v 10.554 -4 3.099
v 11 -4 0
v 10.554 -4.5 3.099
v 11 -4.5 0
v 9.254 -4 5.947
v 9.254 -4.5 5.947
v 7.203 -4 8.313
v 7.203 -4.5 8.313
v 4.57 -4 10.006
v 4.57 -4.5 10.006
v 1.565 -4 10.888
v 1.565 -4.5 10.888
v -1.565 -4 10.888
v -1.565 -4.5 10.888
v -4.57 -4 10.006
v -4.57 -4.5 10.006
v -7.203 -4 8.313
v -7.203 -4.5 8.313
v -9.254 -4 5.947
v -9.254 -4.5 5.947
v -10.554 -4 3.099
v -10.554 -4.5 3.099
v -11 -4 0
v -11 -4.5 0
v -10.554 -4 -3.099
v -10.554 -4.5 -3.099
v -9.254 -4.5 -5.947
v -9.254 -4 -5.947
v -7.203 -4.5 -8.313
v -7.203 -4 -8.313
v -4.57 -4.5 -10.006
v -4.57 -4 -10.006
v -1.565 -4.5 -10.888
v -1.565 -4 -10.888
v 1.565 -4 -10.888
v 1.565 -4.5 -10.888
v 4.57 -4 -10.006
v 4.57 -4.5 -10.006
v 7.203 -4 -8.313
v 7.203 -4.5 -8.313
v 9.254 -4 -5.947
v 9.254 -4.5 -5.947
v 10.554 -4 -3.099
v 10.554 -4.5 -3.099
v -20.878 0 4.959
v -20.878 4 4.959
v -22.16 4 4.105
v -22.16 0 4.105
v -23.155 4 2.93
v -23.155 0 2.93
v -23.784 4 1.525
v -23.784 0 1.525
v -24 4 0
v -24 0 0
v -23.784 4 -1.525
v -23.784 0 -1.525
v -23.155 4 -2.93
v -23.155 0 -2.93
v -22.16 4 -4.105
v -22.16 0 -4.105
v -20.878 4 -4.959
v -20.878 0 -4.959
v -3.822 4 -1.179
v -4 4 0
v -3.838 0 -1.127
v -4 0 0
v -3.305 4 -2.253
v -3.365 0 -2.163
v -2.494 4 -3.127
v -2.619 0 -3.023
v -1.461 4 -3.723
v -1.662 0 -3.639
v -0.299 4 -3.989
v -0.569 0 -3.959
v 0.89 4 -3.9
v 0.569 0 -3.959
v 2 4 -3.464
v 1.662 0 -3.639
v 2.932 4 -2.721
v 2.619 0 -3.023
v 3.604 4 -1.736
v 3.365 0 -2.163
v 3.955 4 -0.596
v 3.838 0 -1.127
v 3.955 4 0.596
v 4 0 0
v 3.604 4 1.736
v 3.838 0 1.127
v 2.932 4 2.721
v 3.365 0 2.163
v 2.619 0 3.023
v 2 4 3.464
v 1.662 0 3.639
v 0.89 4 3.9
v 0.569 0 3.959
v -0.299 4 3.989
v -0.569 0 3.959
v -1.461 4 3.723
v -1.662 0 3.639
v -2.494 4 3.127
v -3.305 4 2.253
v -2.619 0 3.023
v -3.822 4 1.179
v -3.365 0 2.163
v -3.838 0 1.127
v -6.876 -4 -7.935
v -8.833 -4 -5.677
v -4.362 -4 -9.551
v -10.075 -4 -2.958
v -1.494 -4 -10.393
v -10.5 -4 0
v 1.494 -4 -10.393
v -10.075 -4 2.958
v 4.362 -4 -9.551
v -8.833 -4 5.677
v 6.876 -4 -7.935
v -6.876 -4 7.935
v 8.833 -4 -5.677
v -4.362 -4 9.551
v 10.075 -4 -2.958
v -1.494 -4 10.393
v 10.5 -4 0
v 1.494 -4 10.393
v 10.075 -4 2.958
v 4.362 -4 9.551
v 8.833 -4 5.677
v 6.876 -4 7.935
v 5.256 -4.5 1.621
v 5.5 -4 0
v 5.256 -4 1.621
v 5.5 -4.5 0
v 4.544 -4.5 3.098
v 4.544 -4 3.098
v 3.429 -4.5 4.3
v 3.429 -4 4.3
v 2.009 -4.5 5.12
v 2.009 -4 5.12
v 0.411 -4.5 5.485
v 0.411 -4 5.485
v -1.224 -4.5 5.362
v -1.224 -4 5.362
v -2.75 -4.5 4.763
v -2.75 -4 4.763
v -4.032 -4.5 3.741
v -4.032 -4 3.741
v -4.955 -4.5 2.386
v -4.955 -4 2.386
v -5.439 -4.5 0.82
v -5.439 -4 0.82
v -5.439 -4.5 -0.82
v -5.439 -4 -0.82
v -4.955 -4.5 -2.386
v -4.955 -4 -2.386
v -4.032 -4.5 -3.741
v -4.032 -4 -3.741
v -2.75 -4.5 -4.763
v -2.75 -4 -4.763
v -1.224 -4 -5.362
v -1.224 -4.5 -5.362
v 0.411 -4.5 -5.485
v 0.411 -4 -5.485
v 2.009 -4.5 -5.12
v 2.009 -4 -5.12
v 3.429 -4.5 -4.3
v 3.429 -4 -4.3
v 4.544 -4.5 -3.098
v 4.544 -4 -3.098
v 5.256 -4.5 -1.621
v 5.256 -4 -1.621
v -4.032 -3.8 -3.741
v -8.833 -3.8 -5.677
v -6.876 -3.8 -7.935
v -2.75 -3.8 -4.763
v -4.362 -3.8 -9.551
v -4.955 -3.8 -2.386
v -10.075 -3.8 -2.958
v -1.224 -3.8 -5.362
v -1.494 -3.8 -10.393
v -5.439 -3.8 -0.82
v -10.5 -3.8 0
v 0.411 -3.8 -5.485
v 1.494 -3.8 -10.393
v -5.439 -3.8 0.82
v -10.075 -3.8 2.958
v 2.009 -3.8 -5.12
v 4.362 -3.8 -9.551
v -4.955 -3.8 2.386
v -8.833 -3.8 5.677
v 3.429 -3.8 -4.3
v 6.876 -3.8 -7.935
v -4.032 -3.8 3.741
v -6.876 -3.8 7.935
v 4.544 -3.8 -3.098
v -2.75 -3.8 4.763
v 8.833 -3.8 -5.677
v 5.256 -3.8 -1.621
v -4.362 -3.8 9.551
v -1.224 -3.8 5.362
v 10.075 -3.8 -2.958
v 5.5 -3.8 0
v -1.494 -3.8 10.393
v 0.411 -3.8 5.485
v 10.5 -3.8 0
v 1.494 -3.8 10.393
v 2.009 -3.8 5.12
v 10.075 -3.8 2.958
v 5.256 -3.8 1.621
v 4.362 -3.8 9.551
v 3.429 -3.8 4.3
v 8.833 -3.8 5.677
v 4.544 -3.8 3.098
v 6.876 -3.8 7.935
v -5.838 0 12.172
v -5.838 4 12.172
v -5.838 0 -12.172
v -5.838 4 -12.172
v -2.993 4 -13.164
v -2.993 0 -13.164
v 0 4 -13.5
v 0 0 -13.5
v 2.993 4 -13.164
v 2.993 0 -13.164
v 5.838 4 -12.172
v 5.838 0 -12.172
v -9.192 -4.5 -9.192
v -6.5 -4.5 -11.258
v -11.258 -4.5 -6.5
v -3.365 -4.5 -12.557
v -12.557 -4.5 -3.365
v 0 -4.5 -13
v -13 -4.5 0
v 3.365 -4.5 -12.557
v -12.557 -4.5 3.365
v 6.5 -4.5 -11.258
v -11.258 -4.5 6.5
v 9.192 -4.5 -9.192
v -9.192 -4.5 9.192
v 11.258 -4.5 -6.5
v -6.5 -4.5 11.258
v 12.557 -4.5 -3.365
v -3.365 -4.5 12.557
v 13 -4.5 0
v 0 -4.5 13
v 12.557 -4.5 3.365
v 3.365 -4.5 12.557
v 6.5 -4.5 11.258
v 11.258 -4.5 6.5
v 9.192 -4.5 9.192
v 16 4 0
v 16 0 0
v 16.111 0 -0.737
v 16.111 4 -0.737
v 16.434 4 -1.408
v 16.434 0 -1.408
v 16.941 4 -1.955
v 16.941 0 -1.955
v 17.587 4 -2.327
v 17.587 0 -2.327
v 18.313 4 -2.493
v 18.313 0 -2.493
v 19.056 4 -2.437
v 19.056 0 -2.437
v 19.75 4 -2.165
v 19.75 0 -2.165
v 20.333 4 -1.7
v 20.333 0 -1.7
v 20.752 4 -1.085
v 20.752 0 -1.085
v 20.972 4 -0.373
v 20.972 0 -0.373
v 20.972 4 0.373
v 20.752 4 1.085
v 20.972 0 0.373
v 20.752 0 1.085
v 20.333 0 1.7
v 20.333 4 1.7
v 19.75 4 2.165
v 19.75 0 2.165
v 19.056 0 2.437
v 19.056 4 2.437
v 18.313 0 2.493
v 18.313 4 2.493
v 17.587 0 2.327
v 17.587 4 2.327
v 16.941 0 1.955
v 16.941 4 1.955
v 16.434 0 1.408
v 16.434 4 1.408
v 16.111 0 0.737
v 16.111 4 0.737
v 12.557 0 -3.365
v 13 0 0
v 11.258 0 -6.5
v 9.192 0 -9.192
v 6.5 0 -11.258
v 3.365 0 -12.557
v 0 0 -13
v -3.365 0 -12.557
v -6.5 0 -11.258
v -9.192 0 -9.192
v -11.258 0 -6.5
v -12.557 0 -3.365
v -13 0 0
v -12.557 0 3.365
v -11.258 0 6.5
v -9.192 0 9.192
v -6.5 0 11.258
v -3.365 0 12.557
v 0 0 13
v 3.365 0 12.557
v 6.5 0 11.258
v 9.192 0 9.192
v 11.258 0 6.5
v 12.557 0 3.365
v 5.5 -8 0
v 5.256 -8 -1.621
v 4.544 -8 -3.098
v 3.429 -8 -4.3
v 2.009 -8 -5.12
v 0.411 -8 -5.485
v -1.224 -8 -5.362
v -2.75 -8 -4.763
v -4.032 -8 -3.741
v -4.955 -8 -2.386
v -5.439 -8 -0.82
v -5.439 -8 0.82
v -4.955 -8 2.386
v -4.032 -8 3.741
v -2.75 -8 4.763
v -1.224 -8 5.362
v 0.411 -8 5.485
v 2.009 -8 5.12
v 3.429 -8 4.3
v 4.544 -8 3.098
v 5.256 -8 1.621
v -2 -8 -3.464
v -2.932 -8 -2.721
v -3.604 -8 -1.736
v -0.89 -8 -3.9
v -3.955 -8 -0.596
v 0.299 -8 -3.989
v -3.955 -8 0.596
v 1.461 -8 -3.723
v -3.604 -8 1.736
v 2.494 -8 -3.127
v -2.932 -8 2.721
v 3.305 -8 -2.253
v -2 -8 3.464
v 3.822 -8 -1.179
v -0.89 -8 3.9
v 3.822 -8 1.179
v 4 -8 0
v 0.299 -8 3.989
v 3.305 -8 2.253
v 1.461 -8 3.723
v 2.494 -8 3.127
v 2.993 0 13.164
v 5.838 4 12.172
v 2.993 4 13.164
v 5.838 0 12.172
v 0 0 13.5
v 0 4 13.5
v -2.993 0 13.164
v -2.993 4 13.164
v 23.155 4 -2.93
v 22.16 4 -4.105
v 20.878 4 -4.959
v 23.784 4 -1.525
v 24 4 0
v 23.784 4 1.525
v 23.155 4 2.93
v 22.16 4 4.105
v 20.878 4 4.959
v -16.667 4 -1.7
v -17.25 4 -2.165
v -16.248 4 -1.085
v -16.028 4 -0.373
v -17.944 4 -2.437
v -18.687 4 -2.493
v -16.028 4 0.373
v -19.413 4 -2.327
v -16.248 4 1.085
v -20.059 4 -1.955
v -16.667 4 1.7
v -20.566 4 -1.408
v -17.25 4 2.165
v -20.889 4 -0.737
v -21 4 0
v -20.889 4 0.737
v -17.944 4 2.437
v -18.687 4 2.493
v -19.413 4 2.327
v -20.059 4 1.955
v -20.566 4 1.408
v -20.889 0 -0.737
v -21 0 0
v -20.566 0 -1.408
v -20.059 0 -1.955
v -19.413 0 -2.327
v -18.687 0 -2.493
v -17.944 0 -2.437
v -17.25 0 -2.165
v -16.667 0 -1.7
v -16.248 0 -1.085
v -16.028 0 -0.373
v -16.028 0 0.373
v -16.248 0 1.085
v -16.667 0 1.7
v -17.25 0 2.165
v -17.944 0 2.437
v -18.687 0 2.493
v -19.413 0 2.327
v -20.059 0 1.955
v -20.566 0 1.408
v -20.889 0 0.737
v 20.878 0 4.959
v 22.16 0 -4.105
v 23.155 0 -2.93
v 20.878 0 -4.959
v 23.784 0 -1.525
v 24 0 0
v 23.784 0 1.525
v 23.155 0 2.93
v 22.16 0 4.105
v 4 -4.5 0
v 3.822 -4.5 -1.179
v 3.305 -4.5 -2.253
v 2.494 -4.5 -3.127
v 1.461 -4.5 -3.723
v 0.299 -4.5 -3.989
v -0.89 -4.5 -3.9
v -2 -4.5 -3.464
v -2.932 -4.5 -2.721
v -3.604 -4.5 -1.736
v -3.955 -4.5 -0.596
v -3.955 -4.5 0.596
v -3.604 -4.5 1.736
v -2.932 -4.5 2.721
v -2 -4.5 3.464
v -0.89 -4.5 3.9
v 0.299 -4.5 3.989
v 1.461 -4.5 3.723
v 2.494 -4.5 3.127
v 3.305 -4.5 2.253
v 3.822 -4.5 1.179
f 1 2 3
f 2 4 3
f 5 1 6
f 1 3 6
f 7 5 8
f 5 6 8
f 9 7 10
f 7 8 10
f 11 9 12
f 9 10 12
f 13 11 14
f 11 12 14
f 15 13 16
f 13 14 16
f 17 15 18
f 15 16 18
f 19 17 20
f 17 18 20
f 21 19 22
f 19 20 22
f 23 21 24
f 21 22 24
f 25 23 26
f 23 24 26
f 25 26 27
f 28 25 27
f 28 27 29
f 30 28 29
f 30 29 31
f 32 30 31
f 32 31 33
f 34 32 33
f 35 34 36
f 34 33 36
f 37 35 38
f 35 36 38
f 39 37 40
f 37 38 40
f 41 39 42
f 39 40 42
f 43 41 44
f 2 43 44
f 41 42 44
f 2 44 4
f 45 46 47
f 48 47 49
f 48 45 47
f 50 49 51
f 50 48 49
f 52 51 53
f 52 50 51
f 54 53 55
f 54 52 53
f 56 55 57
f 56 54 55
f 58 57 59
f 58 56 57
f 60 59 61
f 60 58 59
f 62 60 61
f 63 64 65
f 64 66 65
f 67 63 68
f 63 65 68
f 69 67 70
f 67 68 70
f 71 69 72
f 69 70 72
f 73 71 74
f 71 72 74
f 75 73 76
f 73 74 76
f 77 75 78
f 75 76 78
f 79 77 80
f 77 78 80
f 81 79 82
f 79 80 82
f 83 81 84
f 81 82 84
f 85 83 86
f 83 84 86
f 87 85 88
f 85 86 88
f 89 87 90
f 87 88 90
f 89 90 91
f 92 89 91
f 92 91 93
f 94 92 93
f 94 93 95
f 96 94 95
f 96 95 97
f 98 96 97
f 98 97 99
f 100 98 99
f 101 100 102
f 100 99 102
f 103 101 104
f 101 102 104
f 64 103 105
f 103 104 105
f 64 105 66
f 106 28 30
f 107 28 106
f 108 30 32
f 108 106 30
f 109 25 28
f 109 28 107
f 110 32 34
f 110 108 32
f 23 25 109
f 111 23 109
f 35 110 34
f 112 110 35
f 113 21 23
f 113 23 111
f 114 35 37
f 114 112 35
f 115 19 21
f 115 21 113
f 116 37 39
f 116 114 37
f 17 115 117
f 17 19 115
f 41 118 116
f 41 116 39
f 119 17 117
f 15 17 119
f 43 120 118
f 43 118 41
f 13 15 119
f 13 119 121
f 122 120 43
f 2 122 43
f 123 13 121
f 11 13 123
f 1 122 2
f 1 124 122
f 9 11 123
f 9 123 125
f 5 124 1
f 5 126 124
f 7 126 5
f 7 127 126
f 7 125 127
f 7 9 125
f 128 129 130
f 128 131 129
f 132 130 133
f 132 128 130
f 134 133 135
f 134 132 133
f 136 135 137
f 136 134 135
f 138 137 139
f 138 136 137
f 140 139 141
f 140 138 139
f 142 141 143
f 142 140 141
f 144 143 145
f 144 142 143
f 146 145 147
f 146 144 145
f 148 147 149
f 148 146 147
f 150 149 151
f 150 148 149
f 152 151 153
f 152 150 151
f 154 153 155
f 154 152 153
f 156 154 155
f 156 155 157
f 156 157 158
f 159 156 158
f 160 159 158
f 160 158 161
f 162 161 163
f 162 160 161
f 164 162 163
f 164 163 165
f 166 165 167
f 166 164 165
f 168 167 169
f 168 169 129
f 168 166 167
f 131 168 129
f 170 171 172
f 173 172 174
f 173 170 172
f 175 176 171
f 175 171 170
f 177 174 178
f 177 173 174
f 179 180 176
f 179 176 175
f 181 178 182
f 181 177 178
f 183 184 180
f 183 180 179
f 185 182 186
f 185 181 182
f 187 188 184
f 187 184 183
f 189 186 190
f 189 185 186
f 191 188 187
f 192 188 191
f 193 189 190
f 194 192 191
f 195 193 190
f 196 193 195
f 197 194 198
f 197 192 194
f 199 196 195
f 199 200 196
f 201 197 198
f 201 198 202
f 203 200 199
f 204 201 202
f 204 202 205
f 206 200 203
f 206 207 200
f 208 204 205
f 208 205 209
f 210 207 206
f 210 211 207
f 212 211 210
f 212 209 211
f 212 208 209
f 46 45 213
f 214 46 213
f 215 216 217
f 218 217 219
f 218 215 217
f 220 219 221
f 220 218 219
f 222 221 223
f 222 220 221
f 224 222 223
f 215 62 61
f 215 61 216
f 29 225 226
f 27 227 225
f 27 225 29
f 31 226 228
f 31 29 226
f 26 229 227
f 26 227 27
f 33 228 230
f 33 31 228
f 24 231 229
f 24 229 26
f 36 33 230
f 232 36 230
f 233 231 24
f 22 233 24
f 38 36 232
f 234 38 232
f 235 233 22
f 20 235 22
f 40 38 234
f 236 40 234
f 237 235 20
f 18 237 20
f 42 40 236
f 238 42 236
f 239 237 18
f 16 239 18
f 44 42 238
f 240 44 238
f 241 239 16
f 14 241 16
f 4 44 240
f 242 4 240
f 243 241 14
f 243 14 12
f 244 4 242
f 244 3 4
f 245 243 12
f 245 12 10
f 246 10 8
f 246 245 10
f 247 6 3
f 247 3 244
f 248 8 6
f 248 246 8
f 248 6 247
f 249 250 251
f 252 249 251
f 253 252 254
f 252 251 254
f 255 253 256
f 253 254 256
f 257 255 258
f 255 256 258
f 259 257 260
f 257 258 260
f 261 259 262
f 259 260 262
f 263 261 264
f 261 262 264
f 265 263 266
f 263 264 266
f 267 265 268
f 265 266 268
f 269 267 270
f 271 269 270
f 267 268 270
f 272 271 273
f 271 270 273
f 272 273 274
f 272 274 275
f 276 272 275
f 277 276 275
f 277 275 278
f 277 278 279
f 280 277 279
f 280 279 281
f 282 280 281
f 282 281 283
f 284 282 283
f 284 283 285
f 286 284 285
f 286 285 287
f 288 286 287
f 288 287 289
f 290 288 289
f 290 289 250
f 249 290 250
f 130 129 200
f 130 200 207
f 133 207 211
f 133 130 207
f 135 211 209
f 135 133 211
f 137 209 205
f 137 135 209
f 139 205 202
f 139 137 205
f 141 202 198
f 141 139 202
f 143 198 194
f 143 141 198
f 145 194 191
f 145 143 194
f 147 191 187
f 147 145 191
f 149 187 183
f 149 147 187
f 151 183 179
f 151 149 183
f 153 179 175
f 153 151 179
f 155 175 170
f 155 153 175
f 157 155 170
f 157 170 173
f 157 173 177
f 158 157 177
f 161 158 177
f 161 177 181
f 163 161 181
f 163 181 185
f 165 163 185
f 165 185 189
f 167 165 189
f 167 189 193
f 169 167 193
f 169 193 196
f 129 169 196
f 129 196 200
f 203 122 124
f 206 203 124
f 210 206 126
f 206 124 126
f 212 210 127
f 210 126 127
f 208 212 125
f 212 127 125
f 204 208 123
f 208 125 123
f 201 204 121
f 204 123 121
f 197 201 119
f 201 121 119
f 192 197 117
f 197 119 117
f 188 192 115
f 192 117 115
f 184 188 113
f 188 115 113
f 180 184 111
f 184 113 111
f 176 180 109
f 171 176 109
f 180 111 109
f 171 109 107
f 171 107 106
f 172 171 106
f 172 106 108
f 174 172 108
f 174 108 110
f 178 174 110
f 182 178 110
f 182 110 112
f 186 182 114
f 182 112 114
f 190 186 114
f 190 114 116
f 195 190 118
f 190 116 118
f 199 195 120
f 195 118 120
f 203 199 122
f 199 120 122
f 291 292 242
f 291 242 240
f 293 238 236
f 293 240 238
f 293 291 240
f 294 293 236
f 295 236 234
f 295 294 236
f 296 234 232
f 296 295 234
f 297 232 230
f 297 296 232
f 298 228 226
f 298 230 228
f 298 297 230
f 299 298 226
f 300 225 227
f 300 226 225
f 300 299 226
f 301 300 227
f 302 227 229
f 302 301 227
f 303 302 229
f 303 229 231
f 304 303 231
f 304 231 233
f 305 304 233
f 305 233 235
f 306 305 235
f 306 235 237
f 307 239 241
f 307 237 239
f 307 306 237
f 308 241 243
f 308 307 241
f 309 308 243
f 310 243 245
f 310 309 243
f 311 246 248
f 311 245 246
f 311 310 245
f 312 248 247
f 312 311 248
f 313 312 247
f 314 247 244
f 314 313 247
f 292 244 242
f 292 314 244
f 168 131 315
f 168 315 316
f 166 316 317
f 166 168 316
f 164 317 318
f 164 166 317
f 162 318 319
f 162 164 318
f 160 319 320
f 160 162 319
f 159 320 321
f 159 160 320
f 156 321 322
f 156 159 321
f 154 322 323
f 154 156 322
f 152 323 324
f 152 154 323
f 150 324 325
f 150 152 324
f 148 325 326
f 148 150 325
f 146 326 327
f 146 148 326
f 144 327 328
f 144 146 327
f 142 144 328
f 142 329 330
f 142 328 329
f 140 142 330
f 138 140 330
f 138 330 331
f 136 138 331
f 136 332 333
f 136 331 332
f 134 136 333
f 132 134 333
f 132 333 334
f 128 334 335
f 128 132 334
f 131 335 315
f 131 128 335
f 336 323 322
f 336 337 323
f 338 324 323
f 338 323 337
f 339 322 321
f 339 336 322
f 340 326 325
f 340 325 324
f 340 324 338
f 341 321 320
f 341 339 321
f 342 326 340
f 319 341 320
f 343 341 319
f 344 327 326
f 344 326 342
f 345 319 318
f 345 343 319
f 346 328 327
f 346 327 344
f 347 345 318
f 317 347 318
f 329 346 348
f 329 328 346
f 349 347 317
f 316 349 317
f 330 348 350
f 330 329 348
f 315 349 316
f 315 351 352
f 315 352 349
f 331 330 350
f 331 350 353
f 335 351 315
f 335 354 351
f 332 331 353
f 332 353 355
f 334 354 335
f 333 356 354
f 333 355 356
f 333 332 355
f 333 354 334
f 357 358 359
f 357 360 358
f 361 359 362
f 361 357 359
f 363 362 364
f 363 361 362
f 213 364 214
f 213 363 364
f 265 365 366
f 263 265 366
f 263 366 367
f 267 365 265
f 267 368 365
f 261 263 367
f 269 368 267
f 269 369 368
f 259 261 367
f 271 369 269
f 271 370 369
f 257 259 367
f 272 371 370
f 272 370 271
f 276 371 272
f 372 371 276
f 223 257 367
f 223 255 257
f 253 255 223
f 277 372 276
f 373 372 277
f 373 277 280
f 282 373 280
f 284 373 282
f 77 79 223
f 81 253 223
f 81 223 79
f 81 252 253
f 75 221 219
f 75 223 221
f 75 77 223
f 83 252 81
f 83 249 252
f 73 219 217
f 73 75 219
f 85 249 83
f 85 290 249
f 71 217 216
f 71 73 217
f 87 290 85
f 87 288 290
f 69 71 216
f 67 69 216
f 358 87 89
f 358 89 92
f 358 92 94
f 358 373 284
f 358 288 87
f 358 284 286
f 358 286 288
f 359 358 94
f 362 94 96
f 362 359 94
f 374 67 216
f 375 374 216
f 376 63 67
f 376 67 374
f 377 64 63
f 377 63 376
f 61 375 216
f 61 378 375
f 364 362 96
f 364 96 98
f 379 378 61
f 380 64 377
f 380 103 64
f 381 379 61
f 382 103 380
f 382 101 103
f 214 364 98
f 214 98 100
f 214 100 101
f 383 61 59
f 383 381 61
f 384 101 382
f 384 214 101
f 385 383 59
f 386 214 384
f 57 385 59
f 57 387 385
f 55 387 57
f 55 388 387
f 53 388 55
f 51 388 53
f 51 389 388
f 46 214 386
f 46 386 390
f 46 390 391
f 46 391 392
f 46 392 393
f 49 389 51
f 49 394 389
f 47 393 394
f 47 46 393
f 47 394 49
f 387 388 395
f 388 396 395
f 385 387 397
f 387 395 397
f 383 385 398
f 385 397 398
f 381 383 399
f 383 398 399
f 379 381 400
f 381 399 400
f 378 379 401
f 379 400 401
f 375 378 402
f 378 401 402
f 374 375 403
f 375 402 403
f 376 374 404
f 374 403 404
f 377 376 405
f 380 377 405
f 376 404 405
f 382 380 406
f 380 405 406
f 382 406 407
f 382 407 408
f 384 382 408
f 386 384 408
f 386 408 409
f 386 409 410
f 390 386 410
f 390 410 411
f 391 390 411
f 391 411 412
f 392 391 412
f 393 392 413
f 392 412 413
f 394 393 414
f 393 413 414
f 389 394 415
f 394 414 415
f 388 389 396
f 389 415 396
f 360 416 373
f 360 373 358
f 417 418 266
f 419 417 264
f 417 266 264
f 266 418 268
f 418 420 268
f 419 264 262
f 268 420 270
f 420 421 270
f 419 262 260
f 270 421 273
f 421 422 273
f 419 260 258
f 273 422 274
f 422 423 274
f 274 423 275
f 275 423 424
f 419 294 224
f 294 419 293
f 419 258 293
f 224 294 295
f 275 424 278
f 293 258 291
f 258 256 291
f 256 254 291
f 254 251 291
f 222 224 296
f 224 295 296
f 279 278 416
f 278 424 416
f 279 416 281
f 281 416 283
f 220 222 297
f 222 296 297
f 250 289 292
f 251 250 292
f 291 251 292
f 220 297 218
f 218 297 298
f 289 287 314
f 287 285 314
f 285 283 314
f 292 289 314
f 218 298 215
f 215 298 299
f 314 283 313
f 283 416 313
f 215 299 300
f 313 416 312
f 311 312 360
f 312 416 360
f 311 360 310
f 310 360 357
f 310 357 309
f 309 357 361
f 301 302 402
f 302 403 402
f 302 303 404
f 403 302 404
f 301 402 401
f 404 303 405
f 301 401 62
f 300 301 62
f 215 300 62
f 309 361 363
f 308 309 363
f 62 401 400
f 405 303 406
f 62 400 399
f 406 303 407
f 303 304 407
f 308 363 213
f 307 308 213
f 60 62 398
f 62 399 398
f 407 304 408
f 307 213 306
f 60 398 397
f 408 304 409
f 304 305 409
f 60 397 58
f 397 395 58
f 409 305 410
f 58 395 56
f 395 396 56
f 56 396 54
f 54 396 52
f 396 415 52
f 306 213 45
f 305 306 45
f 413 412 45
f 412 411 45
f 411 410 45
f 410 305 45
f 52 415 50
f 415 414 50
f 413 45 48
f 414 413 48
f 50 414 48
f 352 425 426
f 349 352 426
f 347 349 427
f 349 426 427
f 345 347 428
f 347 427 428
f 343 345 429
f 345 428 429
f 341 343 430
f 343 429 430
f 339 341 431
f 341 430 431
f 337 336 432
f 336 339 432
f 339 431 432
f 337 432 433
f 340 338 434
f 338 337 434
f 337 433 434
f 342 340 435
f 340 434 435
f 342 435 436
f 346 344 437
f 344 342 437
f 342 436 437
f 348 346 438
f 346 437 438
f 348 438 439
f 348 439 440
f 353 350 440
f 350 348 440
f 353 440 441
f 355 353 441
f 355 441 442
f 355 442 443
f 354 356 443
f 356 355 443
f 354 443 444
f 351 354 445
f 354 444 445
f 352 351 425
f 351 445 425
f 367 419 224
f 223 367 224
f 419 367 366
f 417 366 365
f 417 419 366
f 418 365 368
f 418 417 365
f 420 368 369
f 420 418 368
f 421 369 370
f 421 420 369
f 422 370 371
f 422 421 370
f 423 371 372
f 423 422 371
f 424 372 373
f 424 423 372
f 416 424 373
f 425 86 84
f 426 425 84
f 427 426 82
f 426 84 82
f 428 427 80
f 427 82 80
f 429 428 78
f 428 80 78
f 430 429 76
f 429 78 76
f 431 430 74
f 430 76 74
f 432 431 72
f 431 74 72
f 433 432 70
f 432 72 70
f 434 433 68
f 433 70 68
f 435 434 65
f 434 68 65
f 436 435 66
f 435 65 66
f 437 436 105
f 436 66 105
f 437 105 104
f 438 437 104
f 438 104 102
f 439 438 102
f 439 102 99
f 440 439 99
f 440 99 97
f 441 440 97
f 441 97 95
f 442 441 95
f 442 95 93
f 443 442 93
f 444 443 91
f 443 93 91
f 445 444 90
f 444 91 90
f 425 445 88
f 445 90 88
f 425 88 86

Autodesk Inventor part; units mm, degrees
ref_plane "YZ Plane" through (0, 0, 0) normal (1, 0, 0) x (0, 1, 0)
ref_plane "XZ Plane" through (0, 0, 0) normal (0, 1, 0) x (-1, 0, 0)
ref_plane "XY Plane" through (0, 0, 0) normal (0, 0, 1) x (1, 0, 0)
sketch "Sketch1" plane through (0, 0, 0) normal (0, 1, 0) x (-1, 0, 0)
  circle A0 centre (0, 0) radius 4
  arc A1 (-5.8378, -12.1725) -> (-5.8378, 12.1725) centre (0, 0) ccw
  circle A2 centre (18.5, 0) radius 2.5
  circle A3 centre (-18.5, 0) radius 2.5
  line L0 (0, -18.9) -> (0, 18.9) projected
  line L1 (20.8784, 4.9592) -> (5.8378, 12.1725)
  line L2 (33.6, 0) -> (-33.6, 0) projected
  line L3 (20.8784, -4.9592) -> (5.8378, -12.1725)
  line L4 (-20.8784, 4.9592) -> (-5.8378, 12.1725)
  line L5 (-20.8784, -4.9592) -> (-5.8378, -12.1725)
  arc A4 (-20.8784, 4.9592) -> (-20.8784, -4.9592) centre (-18.5, 0) ccw
  arc A5 (20.8784, -4.9592) -> (20.8784, 4.9592) centre (18.5, 0) ccw
  dimension "d0" = 8
  dimension "d1" = 27
  dimension "d2" = 5
  dimension "d3" = 5
  dimension "d4" = 37
  dimension "d5" = 18.5
extrude "Extrusion1" add sketch "Sketch1" along normal blind 4 contours L2 A1 L0 A0 | A0 L0 A1 L2 | A0 L2 A3 A4 L4 A1 L0 | L0 A1 L5 A4 L2 A3 A0 | L2 A2 A5 L3 A1 | A1 L1 A5 L2 A2
sketch "Sketch2" plane through (0, 0, 0) normal (0, -1, 0) x (1, 0, 0)
  circle A0 centre (0, 0) radius 4
  circle A1 centre (0, 0) radius 13
  dimension "d11" = 26
extrude "Extrusion2" add sketch "Sketch2" along normal blind 4.5
sketch "Sketch3" plane through (0, -4.5, 0) normal (0, -1, 0) x (1, 0, 0)
  circle A0 centre (0, 0) radius 4
  circle A1 centre (0, 0) radius 4 projected
  circle A2 centre (0, 0) radius 5.5
  dimension "d14" = 11
extrude "Extrusion3" add sketch "Sketch3" along normal blind 3.5
sketch "Sketch4" plane through (0, -4.5, 0) normal (0, -1, 0) x (1, 0, 0)
  circle A0 centre (0, 0) radius 5.5
  circle A1 centre (0, 0) radius 5.5 projected
  circle A2 centre (0, 0) radius 11
  dimension "d17" = 22
extrude "Extrusion4" cut sketch "Sketch4" against normal blind 0.5
sketch "Sketch5" plane through (0, -4, 0) normal (0, -1, 0) x (1, 0, 0)
  circle A0 centre (0, 0) radius 5.5
  circle A1 centre (0, 0) radius 10.5
  dimension "d20" = 21
extrude "Extrusion5" cut sketch "Sketch5" against normal blind 0.2
properties part number "Kep Truc KLF-08"
